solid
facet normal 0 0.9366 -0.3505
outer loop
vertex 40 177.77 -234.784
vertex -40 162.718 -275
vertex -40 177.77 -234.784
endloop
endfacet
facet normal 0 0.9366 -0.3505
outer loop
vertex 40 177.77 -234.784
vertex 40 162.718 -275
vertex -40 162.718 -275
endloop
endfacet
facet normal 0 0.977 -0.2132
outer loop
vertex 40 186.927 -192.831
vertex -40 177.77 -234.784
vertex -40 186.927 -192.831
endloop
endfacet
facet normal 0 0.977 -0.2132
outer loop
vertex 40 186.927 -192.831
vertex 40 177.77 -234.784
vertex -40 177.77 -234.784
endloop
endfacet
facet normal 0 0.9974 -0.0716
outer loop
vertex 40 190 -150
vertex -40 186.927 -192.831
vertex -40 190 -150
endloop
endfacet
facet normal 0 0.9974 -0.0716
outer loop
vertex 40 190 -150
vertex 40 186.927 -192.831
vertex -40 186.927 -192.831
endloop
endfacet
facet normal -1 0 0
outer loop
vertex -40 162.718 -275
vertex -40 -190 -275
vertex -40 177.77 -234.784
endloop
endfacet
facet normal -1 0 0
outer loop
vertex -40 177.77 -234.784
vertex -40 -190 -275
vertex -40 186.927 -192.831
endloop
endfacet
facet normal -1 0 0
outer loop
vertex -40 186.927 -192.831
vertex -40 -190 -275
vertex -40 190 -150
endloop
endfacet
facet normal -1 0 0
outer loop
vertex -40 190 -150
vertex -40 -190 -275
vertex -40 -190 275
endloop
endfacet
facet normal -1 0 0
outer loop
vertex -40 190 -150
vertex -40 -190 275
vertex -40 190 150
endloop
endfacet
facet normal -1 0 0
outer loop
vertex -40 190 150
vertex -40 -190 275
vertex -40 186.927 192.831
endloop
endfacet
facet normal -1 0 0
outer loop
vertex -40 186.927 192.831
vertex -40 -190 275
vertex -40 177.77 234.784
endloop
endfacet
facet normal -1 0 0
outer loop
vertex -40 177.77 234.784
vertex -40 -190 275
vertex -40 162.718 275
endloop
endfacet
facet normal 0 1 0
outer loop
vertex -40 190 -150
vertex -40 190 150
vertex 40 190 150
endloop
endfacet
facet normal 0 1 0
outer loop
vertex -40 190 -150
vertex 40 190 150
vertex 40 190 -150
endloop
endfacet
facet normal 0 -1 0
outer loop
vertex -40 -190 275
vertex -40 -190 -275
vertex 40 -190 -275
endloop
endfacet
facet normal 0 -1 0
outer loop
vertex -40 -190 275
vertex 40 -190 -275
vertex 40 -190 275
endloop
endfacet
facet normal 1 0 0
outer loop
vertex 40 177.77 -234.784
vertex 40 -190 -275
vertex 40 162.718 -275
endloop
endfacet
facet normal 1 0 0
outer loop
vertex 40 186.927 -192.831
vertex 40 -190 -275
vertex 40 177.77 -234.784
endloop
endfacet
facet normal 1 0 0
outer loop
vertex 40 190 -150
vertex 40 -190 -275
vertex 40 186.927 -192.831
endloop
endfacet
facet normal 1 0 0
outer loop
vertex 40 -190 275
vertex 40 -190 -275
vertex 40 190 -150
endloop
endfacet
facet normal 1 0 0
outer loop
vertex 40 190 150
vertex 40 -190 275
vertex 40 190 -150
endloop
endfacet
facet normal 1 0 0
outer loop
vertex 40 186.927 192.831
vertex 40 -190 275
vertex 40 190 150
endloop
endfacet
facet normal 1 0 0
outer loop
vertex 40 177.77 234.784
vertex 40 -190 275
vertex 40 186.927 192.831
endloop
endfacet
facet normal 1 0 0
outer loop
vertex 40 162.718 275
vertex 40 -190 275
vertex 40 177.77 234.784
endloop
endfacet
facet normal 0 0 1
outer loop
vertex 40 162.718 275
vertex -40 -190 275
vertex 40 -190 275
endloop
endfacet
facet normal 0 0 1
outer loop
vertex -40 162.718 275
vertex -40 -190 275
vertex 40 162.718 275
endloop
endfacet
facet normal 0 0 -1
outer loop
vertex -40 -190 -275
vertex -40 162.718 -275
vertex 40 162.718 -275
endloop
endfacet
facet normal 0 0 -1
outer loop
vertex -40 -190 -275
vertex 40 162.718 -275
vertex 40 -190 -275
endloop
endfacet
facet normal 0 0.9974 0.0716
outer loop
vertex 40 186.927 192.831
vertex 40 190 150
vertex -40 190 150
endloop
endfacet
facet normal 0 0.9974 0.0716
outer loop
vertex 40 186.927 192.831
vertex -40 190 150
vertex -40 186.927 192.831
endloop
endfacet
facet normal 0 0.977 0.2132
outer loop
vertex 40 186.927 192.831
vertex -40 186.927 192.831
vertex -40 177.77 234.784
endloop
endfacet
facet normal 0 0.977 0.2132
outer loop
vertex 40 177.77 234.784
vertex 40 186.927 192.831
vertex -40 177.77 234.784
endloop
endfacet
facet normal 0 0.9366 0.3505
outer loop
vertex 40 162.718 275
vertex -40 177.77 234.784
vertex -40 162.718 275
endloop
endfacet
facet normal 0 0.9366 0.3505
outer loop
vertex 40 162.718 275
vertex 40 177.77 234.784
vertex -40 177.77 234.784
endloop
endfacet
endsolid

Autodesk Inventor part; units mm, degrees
ref_plane "YZ Plane" through (0, 0, 0) normal (1, 0, 0) x (0, 1, 0)
ref_plane "XZ Plane" through (0, 0, 0) normal (0, 1, 0) x (-1, 0, 0)
ref_plane "XY Plane" through (0, 0, 0) normal (0, 0, 1) x (1, 0, 0)
sketch "Sketch1" plane through (0, 0, 0) normal (1, 0, 0) x (0, 1, 0)
  line L0 (-190, 275) -> (190, 275)
  line L1 (190, 275) -> (190, -275)
  line L2 (190, -275) -> (-190, -275)
  line L3 (-190, -275) -> (-190, 275)
  line L4 (-190, 275) -> (190, -275) construction
  line L5 (190, 275) -> (-190, -275) construction
  point P0 (0, 0)
  dimension "d0" = 550
  dimension "d1" = 380
extrude "Extrusion1" add sketch "Sketch1" along normal mid plane 80
sketch "Sketch2" plane through (40, 0, 0) normal (1, 0, 0) x (0, 0, -1)
  line L0 (275, -190) -> (275, 190) projected
  line L1 (275, 190) -> (-275, 190) projected
  line L2 (-275, 190) -> (-275, -190) projected
  line L3 (-275, -190) -> (275, -190) projected
  line L4 (-150, 190) -> (150, 190)
  line L5 (0, 0) -> (0, 117.6253)
  arc A0 (-150, 190) -> (-275, 162.7178) centre (-150, -110) ccw
  arc A1 (275, 162.7178) -> (150, 190) centre (150, -110) ccw
  point P0 (0, 190)
  point P1 (275, 162.7178)
  dimension "d4" = 300
  dimension "d5" = 300
extrude "Extrusion2" cut sketch "Sketch2" against normal through all contours A1 L1 L0 | L2 L1 A0
properties part number "CARCASA_PANTALLA" material "Steel, Mild, Welded"
